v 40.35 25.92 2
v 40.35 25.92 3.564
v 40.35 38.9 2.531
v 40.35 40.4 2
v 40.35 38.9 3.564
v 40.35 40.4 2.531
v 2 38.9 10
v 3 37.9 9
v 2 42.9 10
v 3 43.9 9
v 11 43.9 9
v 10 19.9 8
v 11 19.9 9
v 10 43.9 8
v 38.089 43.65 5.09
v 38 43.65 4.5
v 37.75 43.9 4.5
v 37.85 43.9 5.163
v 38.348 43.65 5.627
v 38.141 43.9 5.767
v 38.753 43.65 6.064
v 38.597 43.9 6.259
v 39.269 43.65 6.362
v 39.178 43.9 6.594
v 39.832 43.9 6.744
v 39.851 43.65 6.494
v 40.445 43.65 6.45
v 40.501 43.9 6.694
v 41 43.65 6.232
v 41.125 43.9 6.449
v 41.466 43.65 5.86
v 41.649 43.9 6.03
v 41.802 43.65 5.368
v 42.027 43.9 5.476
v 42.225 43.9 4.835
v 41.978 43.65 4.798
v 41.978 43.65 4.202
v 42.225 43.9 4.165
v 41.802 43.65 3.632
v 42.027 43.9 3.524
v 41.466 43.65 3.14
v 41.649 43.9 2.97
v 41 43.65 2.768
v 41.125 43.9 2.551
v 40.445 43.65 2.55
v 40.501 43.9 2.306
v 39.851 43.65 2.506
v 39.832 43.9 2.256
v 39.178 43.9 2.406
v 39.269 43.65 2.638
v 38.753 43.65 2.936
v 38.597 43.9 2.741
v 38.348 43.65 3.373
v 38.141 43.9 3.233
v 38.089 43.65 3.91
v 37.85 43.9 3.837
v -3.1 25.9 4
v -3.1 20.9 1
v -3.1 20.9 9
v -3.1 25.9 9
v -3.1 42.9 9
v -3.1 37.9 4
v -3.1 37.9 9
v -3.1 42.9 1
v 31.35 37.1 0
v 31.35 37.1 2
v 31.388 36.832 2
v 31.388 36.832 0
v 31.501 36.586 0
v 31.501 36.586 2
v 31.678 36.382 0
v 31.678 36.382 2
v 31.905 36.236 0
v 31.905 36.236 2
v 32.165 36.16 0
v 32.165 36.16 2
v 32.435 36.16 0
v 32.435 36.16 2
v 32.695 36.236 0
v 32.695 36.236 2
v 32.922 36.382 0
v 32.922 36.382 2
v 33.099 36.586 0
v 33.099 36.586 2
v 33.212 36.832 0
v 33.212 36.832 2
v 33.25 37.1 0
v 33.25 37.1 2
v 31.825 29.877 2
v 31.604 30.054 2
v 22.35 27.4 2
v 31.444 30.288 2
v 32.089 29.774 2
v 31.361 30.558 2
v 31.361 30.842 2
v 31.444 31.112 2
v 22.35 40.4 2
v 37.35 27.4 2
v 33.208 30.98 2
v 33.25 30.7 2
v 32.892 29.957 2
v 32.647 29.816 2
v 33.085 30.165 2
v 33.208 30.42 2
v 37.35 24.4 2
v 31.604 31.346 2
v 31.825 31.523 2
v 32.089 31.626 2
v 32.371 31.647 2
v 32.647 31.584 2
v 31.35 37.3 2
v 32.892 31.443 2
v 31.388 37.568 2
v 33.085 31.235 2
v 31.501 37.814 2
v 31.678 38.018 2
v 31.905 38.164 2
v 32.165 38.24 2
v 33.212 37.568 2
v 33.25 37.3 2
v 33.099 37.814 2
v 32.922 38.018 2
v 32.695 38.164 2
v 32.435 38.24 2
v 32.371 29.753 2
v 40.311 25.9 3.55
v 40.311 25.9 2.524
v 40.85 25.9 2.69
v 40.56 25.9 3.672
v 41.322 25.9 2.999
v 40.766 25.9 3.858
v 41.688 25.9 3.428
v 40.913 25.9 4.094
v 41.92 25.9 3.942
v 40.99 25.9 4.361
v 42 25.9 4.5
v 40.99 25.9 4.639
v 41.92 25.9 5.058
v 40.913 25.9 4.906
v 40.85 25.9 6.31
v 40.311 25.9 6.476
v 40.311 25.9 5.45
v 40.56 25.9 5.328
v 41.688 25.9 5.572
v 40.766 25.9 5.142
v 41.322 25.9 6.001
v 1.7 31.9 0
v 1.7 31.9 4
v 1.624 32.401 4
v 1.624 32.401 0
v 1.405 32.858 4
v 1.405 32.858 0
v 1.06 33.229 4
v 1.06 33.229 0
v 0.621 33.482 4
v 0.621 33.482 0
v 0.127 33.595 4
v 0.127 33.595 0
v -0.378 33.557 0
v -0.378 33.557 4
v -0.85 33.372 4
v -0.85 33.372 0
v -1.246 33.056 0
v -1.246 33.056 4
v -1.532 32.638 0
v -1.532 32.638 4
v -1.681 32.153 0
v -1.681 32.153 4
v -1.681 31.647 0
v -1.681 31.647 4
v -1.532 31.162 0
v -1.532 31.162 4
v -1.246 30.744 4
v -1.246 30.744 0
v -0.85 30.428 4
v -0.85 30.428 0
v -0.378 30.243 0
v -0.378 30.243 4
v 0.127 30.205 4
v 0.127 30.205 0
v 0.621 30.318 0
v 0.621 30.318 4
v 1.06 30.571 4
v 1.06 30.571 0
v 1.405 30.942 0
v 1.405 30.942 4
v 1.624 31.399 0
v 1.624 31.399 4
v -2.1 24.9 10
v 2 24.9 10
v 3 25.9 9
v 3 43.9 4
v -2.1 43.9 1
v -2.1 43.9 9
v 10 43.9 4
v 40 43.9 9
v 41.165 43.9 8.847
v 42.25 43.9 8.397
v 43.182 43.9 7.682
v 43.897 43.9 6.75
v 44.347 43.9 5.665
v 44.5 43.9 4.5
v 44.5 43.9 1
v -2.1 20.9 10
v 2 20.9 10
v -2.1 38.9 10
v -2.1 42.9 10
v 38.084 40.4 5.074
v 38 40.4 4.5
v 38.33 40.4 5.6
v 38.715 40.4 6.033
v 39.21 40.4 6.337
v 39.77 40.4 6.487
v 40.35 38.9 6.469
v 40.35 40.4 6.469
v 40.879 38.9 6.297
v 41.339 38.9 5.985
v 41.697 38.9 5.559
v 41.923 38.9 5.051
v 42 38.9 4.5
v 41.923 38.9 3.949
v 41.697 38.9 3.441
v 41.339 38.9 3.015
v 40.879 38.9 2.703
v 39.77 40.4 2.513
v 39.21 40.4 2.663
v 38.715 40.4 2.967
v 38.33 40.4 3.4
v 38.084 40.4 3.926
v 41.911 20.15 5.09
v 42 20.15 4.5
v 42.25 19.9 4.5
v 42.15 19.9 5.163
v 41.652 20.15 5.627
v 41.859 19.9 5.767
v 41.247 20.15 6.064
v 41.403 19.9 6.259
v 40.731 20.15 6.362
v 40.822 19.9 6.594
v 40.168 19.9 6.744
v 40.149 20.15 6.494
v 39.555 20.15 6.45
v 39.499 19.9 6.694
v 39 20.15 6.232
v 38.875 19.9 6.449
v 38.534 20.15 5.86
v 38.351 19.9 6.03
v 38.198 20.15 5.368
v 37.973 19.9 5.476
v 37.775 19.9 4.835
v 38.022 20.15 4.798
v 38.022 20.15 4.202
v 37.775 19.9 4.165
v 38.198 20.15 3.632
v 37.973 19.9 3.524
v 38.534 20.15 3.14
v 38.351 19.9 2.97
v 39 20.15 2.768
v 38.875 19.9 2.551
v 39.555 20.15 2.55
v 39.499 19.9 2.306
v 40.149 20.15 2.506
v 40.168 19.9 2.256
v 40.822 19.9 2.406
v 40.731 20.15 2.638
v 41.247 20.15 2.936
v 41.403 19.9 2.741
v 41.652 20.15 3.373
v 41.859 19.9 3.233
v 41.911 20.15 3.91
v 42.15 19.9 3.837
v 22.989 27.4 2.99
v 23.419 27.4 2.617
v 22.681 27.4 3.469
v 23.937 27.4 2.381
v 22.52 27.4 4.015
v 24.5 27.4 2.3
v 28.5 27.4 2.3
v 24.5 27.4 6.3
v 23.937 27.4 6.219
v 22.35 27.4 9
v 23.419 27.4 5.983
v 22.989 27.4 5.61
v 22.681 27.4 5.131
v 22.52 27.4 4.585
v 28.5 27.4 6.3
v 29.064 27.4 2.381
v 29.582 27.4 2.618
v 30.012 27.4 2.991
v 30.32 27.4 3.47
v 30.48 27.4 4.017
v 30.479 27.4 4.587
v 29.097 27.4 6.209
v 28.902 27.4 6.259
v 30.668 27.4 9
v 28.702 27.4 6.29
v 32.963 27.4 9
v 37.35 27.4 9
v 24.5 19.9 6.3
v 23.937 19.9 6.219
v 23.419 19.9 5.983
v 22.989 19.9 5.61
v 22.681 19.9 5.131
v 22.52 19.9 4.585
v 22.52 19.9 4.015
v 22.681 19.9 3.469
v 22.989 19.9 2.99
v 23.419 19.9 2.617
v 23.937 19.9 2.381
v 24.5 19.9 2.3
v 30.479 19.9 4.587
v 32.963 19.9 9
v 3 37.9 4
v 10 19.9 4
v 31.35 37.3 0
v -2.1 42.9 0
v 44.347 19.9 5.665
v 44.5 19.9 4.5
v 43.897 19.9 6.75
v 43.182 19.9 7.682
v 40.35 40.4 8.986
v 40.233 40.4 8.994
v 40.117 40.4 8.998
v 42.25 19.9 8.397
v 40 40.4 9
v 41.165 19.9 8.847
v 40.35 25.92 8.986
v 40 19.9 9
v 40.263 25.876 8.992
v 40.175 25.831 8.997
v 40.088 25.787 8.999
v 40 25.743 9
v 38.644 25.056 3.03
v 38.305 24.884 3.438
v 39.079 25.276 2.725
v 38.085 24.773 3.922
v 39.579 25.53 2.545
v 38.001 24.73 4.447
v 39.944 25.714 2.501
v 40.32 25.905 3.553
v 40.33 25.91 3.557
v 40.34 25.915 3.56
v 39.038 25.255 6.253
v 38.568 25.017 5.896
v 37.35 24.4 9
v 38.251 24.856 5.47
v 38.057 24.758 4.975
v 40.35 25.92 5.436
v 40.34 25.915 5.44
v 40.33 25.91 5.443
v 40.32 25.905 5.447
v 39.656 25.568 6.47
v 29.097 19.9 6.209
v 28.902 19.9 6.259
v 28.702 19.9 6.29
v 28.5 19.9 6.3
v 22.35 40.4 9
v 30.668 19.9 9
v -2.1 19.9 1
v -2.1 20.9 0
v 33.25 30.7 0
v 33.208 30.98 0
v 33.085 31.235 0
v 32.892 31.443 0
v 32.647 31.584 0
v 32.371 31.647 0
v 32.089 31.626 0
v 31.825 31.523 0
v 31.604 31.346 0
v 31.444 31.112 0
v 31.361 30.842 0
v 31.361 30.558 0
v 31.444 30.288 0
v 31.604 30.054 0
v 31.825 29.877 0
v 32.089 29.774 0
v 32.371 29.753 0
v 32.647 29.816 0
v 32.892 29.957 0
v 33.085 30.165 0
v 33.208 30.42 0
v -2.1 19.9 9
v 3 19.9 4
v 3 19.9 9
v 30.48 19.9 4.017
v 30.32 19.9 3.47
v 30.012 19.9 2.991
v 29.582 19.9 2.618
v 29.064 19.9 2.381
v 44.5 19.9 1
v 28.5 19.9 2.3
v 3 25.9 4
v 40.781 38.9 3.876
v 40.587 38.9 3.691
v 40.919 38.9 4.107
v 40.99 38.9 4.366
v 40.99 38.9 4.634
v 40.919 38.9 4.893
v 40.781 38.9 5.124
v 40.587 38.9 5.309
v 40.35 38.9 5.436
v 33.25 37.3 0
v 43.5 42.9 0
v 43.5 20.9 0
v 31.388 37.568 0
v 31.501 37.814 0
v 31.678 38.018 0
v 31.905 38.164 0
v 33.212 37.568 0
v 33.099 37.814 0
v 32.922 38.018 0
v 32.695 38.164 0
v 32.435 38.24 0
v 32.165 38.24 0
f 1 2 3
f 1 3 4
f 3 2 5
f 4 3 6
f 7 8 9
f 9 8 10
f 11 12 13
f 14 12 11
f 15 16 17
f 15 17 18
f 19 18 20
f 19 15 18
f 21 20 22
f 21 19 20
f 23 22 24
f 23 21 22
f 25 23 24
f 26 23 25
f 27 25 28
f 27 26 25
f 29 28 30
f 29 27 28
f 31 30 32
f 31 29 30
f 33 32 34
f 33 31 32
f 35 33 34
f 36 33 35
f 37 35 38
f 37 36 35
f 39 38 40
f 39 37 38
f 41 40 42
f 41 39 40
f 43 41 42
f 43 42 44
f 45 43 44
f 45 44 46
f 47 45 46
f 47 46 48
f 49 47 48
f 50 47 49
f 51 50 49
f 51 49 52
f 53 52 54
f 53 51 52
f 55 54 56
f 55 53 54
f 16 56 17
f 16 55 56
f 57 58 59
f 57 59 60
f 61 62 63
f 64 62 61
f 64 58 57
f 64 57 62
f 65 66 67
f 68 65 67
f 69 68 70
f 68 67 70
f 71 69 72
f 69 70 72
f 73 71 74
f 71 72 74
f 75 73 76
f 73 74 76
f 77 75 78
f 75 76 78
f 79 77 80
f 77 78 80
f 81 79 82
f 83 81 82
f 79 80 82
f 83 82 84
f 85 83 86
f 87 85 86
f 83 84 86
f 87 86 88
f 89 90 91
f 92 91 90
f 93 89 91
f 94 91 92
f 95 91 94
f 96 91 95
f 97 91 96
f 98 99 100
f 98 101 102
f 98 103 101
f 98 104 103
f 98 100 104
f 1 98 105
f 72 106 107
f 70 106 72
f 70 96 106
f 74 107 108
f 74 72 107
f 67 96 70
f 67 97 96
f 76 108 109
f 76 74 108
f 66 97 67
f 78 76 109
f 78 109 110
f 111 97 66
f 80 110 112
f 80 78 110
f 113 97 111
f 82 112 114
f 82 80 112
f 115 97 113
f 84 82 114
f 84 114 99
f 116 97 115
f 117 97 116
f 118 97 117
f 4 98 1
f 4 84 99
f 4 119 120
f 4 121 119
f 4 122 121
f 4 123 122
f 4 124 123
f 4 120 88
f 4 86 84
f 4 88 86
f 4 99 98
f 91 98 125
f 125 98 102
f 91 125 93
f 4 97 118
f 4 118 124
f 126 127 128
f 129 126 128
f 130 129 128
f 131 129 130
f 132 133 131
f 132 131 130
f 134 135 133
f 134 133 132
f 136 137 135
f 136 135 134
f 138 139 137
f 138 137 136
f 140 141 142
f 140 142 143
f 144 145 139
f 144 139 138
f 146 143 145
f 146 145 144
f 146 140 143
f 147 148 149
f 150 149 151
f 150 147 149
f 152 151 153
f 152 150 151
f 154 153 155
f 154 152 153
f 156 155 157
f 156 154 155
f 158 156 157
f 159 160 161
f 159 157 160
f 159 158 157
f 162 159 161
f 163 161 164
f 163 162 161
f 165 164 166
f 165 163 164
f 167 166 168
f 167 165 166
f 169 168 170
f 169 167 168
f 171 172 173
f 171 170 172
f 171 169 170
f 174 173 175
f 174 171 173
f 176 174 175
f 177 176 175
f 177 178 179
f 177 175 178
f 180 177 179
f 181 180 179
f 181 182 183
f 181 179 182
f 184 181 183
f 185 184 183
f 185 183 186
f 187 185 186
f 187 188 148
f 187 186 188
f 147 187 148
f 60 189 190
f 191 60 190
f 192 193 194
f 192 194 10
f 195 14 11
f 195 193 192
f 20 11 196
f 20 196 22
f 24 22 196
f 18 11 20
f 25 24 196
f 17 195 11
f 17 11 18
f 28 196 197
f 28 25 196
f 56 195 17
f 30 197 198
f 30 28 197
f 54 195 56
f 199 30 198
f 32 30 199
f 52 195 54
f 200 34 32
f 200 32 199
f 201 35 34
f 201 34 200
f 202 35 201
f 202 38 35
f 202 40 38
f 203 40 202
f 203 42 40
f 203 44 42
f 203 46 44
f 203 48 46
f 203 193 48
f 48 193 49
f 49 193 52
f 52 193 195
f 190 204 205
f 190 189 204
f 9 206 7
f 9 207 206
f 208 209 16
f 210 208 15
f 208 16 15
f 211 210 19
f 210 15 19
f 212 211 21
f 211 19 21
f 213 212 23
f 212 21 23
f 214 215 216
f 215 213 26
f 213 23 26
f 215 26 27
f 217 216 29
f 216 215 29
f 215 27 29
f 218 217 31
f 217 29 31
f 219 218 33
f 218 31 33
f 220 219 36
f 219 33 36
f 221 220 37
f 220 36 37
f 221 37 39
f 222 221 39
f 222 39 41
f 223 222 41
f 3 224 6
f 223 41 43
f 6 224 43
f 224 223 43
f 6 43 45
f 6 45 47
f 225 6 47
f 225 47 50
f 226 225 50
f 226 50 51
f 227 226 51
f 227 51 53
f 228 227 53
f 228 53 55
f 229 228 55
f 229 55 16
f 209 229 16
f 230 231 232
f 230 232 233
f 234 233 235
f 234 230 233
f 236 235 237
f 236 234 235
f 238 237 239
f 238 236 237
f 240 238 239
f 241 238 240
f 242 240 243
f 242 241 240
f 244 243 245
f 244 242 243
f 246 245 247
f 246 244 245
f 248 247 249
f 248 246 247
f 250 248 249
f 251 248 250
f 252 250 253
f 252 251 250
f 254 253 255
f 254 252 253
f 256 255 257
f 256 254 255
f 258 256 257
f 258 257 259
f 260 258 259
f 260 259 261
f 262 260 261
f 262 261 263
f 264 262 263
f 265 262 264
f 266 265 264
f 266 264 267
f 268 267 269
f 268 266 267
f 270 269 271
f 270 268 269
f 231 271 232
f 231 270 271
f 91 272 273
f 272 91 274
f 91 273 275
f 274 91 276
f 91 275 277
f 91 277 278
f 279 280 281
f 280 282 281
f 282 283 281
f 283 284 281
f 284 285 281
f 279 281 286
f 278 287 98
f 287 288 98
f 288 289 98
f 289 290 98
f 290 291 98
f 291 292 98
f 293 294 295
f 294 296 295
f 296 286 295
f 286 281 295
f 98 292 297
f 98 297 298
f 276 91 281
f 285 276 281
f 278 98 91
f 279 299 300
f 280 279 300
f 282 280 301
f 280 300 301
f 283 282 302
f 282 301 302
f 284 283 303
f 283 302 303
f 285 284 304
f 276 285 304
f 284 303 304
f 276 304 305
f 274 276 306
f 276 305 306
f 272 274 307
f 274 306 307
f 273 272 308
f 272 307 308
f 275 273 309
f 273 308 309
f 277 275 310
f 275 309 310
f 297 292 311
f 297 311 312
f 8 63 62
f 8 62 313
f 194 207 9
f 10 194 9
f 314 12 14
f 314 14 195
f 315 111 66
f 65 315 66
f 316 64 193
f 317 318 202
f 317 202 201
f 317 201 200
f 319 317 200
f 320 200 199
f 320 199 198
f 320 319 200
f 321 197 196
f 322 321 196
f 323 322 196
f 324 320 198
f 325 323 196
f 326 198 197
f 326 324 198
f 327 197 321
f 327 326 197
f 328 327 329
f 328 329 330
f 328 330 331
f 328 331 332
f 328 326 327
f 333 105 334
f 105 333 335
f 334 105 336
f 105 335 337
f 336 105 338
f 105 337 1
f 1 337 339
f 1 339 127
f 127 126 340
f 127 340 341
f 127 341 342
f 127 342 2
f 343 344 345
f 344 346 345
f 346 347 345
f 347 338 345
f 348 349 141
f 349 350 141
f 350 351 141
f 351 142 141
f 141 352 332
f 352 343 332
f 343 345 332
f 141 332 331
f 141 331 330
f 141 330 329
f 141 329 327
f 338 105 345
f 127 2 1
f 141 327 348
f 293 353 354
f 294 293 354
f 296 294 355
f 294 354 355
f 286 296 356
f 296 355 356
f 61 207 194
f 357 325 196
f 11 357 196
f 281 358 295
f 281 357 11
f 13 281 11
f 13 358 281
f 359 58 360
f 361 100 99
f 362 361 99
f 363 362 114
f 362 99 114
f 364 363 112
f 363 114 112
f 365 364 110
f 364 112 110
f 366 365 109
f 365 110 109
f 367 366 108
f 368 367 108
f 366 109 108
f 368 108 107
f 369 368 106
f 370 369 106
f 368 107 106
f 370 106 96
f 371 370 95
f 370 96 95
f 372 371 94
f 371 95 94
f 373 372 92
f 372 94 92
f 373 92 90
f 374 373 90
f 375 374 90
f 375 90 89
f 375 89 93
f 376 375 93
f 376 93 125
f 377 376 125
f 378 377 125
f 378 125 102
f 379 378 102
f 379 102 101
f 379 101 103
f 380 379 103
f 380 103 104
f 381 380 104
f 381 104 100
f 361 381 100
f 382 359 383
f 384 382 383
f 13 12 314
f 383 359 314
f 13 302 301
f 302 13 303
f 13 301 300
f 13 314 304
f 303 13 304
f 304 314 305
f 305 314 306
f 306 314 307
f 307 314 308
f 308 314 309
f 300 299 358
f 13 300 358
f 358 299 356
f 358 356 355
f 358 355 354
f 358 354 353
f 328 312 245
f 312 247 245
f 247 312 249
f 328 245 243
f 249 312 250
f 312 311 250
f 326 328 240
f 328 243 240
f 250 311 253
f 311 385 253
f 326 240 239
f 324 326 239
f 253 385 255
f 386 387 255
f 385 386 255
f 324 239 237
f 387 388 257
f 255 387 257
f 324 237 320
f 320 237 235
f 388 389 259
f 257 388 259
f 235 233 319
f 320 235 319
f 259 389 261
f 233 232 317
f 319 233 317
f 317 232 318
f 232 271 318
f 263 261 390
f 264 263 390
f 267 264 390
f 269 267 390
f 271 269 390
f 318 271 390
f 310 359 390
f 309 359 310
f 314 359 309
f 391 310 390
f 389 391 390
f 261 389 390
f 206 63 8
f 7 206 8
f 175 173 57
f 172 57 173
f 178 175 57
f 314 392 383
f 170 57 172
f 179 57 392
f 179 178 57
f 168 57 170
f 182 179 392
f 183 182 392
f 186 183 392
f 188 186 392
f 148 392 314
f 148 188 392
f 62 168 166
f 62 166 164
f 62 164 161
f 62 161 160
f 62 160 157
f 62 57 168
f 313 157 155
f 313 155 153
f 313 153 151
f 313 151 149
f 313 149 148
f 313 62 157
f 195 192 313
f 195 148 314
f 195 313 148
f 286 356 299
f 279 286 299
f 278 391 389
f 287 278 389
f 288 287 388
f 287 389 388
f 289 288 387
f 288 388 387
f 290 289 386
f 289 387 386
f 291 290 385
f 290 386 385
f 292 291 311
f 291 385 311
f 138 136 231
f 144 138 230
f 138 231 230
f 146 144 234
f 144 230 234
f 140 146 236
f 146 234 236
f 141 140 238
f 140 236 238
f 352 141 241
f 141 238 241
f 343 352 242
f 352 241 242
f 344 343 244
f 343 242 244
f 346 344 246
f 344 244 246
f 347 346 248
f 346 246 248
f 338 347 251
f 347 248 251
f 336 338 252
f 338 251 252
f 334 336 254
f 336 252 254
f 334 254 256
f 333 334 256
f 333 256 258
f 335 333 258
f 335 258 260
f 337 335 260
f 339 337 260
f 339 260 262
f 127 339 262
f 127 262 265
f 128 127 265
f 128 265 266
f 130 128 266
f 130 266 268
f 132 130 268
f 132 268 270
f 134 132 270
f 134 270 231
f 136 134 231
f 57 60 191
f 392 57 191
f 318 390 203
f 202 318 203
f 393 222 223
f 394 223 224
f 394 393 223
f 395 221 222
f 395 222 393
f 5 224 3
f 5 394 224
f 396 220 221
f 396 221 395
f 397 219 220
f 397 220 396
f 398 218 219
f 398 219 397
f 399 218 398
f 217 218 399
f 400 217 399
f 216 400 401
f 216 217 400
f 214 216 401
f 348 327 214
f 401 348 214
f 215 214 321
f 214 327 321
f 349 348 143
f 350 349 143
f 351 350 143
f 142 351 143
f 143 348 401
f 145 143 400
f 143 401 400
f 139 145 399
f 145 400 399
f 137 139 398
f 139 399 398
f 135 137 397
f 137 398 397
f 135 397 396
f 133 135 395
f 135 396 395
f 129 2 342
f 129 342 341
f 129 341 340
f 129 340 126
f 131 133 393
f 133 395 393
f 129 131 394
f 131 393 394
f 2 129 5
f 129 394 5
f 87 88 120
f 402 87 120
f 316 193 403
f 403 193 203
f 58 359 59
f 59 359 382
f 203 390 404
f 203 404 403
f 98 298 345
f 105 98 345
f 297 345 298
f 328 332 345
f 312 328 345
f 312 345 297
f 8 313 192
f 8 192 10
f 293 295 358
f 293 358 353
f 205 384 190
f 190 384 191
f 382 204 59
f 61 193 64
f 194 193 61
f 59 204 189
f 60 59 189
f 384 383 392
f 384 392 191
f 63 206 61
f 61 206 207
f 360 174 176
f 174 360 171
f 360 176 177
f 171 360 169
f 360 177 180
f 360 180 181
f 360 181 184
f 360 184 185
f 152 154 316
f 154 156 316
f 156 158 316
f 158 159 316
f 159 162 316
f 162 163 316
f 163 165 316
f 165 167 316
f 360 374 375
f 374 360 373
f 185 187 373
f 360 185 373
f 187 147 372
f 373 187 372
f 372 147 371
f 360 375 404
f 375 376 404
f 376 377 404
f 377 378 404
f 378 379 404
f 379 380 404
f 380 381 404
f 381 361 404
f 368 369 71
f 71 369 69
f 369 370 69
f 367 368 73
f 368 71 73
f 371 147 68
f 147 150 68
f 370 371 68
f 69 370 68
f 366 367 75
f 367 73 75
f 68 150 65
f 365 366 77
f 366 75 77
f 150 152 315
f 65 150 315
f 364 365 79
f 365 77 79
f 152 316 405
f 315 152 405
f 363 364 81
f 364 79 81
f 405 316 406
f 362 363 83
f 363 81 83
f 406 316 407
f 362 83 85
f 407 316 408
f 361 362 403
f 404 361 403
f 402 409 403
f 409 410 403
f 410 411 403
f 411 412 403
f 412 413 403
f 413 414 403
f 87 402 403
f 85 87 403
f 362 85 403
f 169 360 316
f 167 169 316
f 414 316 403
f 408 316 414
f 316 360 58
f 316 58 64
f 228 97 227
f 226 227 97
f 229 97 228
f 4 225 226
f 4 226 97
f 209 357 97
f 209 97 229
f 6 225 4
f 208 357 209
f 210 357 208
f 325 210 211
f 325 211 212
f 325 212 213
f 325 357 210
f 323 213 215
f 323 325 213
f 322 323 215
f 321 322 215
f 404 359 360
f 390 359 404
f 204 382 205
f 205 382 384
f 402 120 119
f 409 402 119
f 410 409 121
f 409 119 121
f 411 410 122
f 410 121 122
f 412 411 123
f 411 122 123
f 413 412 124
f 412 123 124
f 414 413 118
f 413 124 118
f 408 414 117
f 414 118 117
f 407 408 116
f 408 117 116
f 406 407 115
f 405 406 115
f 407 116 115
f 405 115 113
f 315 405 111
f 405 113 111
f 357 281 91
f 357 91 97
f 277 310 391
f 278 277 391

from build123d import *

# Parameters (mm, degrees)
SKETCH014_W     = 47.6
SKETCH014_H     = 24
SKETCH014_R     = 1.7
PAD003_DEPTH    = 10
POCKET011_DEPTH = 24.001
SKETCH016_R     = 2
POCKET012_DEPTH = 6
SKETCH017_W     = 7
SKETCH017_H     = 12
POCKET013_DEPTH = 6
SKETCH033_R     = 2
POCKET022_DEPTH = 5
SKETCH034_R     = 0.999503
POCKET023_DEPTH = 19.001
SKETCH020_W     = 18
SKETCH020_H     = 13
POCKET024_DEPTH = 7
SKETCH021_R     = 0.95
POCKET025_DEPTH = 5
POCKET026_DEPTH = 7
POCKET027_DEPTH = 8
POCKET028_DEPTH = 8
CHAMFER006_SIZE = 1
CHAMFER007_SIZE = 0.25


with BuildPart() as part:
    # Sketch014 → Pad003 (new body)
    with BuildSketch(Plane.XY):
        with Locations((20.7, 0)):
            Rectangle(SKETCH014_W, SKETCH014_H)
        Circle(SKETCH014_R, mode=Mode.SUBTRACT)
    extrude(amount=PAD003_DEPTH)

    # Sketch015 (on Face3 of Pad003) → Pocket011 (cut, through all)
    with BuildSketch(Plane.XZ.offset(12)):
        with BuildLine():
            Line((3, 10.1), (44.5, 10.1))
            Line((44.5, 4.5), (44.5, 10.1))
            ThreePointArc((44.5, 4.5), (43.181981, 7.68198), (40, 9))
            Line((40, 9), (10, 9))
            Line((10, 9), (10, 4))
            Line((10, 4), (3, 4))
            Line((3, 4), (3, 10.1))
        make_face()
    extrude(amount=-POCKET011_DEPTH, mode=Mode.SUBTRACT)

    # Sketch016 (on Face11 of Pocket011) → Pocket012 (cut)
    with BuildSketch(Plane.XZ.offset(12)):
        with Locations((40, 4.5)):
            Circle(SKETCH016_R)
    extrude(amount=-POCKET012_DEPTH, mode=Mode.SUBTRACT)

    # Sketch017 (on Face9 of Pocket012) → Pocket013 (cut)
    with BuildSketch(Plane.XY.offset(10)):
        Rectangle(SKETCH017_W, SKETCH017_H)
    extrude(amount=-POCKET013_DEPTH, mode=Mode.SUBTRACT)

    # Sketch033 (on Face1 of Pocket013) → Pocket022 (cut)
    with BuildSketch(Plane(origin=(0, 12, 0), x_dir=(-1, 0, 0), z_dir=(0, 1, 0))):
        with Locations((-40, 4.5)):
            Circle(SKETCH033_R)
    extrude(amount=-POCKET022_DEPTH, mode=Mode.SUBTRACT)

    # Sketch034 (on Face20 of Pocket022) → Pocket023 (cut, through all)
    with BuildSketch(Plane(origin=(0, 7, 0), x_dir=(-1, 0, 0), z_dir=(0, 1, 0))):
        with Locations((-40, 4.5)):
            Circle(SKETCH034_R)
    extrude(amount=-POCKET023_DEPTH, mode=Mode.SUBTRACT)

    # Sketch020 (on Face5 of Pocket013) → Pocket024 (cut)
    with BuildSketch(Plane.XY.offset(9)):
        with Locations((31.35, 2)):
            Rectangle(SKETCH020_W, SKETCH020_H)
    extrude(amount=-POCKET024_DEPTH, mode=Mode.SUBTRACT)

    # Sketch021 (on Face27 of Pocket024) → Pocket025 (cut)
    with BuildSketch(Plane.XY.offset(2)):
        with Locations((32.3, -1.2)):
            Circle(SKETCH021_R)
        with BuildLine():
            ThreePointArc((33.25, 5.4), (32.3, 6.35), (31.35, 5.4))
            Line((31.35, 5.4), (31.35, 5.2))
            ThreePointArc((31.35, 5.2), (32.3, 4.25), (33.25, 5.2))
            Line((33.25, 5.2), (33.25, 5.4))
        make_face()
    extrude(amount=-POCKET025_DEPTH, mode=Mode.SUBTRACT)

    # Sketch023 (on Face8 of Pocket025) → Pocket026 (cut)
    with BuildSketch(Plane.XY.offset(9)):
        Polygon((40.35, -4.5), (37.35, -4.5), (37.35, -7.5), (40.35, -5.98), align=None)
    extrude(amount=-POCKET026_DEPTH, mode=Mode.SUBTRACT)

    # Sketch024 (on Face12 of Pocket026) → Pocket027 (cut)
    with BuildSketch(Plane.XZ.offset(12)):
        with BuildLine():
            ThreePointArc((28.5, 2.3), (30.5, 4.3), (28.5, 6.3))
            Line((28.5, 6.3), (24.5, 6.3))
            ThreePointArc((24.5, 6.3), (22.5, 4.3), (24.5, 2.3))
            Line((24.5, 2.3), (28.5, 2.3))
        make_face()
    extrude(amount=-POCKET027_DEPTH, mode=Mode.SUBTRACT)

    # Sketch032 (on Face12 of Pocket027) → Pocket028 (cut)
    with BuildSketch(Plane.XZ.offset(12)):
        Polygon((31.392142, 10.286922), (27.849957, 3.99207), (30.144859, 3.99207), (33.687044, 10.286922), align=None)
    extrude(amount=-POCKET028_DEPTH, mode=Mode.SUBTRACT)

    # Chamfer006
    chamfer006_edges = [part.edges().sort_by_distance(p)[0] for p in [
        (-0.05, -12, 10),
        (-3.1, -9, 10),
        (-0.05, -6, 10),
        (3, -9, 10),
        (-0.05, 6, 10),
        (-3.1, 9, 10),
        (-0.05, 12, 10),
        (3, 9, 10),
        (10, 0, 9),
        (-3.1, -12, 5),
        (-3.1, 12, 5),
        (-3.1, 0, 0),
        (20.7, -12, 0),
        (20.7, 12, 0),
        (44.5, 0, 0),
    ]]
    chamfer(chamfer006_edges, length=CHAMFER006_SIZE)

    # Chamfer007
    chamfer007_edges = [part.edges().sort_by_distance(p)[0] for p in [
        (42, 12, 4.5),
        (38, -12, 4.5),
    ]]
    chamfer(chamfer007_edges, length=CHAMFER007_SIZE)


with BuildPart() as part_1:
    # Body002 placement: moved
    add(part.part.moved(Location((0, 31.9, 0))))


solid = part_1.part
